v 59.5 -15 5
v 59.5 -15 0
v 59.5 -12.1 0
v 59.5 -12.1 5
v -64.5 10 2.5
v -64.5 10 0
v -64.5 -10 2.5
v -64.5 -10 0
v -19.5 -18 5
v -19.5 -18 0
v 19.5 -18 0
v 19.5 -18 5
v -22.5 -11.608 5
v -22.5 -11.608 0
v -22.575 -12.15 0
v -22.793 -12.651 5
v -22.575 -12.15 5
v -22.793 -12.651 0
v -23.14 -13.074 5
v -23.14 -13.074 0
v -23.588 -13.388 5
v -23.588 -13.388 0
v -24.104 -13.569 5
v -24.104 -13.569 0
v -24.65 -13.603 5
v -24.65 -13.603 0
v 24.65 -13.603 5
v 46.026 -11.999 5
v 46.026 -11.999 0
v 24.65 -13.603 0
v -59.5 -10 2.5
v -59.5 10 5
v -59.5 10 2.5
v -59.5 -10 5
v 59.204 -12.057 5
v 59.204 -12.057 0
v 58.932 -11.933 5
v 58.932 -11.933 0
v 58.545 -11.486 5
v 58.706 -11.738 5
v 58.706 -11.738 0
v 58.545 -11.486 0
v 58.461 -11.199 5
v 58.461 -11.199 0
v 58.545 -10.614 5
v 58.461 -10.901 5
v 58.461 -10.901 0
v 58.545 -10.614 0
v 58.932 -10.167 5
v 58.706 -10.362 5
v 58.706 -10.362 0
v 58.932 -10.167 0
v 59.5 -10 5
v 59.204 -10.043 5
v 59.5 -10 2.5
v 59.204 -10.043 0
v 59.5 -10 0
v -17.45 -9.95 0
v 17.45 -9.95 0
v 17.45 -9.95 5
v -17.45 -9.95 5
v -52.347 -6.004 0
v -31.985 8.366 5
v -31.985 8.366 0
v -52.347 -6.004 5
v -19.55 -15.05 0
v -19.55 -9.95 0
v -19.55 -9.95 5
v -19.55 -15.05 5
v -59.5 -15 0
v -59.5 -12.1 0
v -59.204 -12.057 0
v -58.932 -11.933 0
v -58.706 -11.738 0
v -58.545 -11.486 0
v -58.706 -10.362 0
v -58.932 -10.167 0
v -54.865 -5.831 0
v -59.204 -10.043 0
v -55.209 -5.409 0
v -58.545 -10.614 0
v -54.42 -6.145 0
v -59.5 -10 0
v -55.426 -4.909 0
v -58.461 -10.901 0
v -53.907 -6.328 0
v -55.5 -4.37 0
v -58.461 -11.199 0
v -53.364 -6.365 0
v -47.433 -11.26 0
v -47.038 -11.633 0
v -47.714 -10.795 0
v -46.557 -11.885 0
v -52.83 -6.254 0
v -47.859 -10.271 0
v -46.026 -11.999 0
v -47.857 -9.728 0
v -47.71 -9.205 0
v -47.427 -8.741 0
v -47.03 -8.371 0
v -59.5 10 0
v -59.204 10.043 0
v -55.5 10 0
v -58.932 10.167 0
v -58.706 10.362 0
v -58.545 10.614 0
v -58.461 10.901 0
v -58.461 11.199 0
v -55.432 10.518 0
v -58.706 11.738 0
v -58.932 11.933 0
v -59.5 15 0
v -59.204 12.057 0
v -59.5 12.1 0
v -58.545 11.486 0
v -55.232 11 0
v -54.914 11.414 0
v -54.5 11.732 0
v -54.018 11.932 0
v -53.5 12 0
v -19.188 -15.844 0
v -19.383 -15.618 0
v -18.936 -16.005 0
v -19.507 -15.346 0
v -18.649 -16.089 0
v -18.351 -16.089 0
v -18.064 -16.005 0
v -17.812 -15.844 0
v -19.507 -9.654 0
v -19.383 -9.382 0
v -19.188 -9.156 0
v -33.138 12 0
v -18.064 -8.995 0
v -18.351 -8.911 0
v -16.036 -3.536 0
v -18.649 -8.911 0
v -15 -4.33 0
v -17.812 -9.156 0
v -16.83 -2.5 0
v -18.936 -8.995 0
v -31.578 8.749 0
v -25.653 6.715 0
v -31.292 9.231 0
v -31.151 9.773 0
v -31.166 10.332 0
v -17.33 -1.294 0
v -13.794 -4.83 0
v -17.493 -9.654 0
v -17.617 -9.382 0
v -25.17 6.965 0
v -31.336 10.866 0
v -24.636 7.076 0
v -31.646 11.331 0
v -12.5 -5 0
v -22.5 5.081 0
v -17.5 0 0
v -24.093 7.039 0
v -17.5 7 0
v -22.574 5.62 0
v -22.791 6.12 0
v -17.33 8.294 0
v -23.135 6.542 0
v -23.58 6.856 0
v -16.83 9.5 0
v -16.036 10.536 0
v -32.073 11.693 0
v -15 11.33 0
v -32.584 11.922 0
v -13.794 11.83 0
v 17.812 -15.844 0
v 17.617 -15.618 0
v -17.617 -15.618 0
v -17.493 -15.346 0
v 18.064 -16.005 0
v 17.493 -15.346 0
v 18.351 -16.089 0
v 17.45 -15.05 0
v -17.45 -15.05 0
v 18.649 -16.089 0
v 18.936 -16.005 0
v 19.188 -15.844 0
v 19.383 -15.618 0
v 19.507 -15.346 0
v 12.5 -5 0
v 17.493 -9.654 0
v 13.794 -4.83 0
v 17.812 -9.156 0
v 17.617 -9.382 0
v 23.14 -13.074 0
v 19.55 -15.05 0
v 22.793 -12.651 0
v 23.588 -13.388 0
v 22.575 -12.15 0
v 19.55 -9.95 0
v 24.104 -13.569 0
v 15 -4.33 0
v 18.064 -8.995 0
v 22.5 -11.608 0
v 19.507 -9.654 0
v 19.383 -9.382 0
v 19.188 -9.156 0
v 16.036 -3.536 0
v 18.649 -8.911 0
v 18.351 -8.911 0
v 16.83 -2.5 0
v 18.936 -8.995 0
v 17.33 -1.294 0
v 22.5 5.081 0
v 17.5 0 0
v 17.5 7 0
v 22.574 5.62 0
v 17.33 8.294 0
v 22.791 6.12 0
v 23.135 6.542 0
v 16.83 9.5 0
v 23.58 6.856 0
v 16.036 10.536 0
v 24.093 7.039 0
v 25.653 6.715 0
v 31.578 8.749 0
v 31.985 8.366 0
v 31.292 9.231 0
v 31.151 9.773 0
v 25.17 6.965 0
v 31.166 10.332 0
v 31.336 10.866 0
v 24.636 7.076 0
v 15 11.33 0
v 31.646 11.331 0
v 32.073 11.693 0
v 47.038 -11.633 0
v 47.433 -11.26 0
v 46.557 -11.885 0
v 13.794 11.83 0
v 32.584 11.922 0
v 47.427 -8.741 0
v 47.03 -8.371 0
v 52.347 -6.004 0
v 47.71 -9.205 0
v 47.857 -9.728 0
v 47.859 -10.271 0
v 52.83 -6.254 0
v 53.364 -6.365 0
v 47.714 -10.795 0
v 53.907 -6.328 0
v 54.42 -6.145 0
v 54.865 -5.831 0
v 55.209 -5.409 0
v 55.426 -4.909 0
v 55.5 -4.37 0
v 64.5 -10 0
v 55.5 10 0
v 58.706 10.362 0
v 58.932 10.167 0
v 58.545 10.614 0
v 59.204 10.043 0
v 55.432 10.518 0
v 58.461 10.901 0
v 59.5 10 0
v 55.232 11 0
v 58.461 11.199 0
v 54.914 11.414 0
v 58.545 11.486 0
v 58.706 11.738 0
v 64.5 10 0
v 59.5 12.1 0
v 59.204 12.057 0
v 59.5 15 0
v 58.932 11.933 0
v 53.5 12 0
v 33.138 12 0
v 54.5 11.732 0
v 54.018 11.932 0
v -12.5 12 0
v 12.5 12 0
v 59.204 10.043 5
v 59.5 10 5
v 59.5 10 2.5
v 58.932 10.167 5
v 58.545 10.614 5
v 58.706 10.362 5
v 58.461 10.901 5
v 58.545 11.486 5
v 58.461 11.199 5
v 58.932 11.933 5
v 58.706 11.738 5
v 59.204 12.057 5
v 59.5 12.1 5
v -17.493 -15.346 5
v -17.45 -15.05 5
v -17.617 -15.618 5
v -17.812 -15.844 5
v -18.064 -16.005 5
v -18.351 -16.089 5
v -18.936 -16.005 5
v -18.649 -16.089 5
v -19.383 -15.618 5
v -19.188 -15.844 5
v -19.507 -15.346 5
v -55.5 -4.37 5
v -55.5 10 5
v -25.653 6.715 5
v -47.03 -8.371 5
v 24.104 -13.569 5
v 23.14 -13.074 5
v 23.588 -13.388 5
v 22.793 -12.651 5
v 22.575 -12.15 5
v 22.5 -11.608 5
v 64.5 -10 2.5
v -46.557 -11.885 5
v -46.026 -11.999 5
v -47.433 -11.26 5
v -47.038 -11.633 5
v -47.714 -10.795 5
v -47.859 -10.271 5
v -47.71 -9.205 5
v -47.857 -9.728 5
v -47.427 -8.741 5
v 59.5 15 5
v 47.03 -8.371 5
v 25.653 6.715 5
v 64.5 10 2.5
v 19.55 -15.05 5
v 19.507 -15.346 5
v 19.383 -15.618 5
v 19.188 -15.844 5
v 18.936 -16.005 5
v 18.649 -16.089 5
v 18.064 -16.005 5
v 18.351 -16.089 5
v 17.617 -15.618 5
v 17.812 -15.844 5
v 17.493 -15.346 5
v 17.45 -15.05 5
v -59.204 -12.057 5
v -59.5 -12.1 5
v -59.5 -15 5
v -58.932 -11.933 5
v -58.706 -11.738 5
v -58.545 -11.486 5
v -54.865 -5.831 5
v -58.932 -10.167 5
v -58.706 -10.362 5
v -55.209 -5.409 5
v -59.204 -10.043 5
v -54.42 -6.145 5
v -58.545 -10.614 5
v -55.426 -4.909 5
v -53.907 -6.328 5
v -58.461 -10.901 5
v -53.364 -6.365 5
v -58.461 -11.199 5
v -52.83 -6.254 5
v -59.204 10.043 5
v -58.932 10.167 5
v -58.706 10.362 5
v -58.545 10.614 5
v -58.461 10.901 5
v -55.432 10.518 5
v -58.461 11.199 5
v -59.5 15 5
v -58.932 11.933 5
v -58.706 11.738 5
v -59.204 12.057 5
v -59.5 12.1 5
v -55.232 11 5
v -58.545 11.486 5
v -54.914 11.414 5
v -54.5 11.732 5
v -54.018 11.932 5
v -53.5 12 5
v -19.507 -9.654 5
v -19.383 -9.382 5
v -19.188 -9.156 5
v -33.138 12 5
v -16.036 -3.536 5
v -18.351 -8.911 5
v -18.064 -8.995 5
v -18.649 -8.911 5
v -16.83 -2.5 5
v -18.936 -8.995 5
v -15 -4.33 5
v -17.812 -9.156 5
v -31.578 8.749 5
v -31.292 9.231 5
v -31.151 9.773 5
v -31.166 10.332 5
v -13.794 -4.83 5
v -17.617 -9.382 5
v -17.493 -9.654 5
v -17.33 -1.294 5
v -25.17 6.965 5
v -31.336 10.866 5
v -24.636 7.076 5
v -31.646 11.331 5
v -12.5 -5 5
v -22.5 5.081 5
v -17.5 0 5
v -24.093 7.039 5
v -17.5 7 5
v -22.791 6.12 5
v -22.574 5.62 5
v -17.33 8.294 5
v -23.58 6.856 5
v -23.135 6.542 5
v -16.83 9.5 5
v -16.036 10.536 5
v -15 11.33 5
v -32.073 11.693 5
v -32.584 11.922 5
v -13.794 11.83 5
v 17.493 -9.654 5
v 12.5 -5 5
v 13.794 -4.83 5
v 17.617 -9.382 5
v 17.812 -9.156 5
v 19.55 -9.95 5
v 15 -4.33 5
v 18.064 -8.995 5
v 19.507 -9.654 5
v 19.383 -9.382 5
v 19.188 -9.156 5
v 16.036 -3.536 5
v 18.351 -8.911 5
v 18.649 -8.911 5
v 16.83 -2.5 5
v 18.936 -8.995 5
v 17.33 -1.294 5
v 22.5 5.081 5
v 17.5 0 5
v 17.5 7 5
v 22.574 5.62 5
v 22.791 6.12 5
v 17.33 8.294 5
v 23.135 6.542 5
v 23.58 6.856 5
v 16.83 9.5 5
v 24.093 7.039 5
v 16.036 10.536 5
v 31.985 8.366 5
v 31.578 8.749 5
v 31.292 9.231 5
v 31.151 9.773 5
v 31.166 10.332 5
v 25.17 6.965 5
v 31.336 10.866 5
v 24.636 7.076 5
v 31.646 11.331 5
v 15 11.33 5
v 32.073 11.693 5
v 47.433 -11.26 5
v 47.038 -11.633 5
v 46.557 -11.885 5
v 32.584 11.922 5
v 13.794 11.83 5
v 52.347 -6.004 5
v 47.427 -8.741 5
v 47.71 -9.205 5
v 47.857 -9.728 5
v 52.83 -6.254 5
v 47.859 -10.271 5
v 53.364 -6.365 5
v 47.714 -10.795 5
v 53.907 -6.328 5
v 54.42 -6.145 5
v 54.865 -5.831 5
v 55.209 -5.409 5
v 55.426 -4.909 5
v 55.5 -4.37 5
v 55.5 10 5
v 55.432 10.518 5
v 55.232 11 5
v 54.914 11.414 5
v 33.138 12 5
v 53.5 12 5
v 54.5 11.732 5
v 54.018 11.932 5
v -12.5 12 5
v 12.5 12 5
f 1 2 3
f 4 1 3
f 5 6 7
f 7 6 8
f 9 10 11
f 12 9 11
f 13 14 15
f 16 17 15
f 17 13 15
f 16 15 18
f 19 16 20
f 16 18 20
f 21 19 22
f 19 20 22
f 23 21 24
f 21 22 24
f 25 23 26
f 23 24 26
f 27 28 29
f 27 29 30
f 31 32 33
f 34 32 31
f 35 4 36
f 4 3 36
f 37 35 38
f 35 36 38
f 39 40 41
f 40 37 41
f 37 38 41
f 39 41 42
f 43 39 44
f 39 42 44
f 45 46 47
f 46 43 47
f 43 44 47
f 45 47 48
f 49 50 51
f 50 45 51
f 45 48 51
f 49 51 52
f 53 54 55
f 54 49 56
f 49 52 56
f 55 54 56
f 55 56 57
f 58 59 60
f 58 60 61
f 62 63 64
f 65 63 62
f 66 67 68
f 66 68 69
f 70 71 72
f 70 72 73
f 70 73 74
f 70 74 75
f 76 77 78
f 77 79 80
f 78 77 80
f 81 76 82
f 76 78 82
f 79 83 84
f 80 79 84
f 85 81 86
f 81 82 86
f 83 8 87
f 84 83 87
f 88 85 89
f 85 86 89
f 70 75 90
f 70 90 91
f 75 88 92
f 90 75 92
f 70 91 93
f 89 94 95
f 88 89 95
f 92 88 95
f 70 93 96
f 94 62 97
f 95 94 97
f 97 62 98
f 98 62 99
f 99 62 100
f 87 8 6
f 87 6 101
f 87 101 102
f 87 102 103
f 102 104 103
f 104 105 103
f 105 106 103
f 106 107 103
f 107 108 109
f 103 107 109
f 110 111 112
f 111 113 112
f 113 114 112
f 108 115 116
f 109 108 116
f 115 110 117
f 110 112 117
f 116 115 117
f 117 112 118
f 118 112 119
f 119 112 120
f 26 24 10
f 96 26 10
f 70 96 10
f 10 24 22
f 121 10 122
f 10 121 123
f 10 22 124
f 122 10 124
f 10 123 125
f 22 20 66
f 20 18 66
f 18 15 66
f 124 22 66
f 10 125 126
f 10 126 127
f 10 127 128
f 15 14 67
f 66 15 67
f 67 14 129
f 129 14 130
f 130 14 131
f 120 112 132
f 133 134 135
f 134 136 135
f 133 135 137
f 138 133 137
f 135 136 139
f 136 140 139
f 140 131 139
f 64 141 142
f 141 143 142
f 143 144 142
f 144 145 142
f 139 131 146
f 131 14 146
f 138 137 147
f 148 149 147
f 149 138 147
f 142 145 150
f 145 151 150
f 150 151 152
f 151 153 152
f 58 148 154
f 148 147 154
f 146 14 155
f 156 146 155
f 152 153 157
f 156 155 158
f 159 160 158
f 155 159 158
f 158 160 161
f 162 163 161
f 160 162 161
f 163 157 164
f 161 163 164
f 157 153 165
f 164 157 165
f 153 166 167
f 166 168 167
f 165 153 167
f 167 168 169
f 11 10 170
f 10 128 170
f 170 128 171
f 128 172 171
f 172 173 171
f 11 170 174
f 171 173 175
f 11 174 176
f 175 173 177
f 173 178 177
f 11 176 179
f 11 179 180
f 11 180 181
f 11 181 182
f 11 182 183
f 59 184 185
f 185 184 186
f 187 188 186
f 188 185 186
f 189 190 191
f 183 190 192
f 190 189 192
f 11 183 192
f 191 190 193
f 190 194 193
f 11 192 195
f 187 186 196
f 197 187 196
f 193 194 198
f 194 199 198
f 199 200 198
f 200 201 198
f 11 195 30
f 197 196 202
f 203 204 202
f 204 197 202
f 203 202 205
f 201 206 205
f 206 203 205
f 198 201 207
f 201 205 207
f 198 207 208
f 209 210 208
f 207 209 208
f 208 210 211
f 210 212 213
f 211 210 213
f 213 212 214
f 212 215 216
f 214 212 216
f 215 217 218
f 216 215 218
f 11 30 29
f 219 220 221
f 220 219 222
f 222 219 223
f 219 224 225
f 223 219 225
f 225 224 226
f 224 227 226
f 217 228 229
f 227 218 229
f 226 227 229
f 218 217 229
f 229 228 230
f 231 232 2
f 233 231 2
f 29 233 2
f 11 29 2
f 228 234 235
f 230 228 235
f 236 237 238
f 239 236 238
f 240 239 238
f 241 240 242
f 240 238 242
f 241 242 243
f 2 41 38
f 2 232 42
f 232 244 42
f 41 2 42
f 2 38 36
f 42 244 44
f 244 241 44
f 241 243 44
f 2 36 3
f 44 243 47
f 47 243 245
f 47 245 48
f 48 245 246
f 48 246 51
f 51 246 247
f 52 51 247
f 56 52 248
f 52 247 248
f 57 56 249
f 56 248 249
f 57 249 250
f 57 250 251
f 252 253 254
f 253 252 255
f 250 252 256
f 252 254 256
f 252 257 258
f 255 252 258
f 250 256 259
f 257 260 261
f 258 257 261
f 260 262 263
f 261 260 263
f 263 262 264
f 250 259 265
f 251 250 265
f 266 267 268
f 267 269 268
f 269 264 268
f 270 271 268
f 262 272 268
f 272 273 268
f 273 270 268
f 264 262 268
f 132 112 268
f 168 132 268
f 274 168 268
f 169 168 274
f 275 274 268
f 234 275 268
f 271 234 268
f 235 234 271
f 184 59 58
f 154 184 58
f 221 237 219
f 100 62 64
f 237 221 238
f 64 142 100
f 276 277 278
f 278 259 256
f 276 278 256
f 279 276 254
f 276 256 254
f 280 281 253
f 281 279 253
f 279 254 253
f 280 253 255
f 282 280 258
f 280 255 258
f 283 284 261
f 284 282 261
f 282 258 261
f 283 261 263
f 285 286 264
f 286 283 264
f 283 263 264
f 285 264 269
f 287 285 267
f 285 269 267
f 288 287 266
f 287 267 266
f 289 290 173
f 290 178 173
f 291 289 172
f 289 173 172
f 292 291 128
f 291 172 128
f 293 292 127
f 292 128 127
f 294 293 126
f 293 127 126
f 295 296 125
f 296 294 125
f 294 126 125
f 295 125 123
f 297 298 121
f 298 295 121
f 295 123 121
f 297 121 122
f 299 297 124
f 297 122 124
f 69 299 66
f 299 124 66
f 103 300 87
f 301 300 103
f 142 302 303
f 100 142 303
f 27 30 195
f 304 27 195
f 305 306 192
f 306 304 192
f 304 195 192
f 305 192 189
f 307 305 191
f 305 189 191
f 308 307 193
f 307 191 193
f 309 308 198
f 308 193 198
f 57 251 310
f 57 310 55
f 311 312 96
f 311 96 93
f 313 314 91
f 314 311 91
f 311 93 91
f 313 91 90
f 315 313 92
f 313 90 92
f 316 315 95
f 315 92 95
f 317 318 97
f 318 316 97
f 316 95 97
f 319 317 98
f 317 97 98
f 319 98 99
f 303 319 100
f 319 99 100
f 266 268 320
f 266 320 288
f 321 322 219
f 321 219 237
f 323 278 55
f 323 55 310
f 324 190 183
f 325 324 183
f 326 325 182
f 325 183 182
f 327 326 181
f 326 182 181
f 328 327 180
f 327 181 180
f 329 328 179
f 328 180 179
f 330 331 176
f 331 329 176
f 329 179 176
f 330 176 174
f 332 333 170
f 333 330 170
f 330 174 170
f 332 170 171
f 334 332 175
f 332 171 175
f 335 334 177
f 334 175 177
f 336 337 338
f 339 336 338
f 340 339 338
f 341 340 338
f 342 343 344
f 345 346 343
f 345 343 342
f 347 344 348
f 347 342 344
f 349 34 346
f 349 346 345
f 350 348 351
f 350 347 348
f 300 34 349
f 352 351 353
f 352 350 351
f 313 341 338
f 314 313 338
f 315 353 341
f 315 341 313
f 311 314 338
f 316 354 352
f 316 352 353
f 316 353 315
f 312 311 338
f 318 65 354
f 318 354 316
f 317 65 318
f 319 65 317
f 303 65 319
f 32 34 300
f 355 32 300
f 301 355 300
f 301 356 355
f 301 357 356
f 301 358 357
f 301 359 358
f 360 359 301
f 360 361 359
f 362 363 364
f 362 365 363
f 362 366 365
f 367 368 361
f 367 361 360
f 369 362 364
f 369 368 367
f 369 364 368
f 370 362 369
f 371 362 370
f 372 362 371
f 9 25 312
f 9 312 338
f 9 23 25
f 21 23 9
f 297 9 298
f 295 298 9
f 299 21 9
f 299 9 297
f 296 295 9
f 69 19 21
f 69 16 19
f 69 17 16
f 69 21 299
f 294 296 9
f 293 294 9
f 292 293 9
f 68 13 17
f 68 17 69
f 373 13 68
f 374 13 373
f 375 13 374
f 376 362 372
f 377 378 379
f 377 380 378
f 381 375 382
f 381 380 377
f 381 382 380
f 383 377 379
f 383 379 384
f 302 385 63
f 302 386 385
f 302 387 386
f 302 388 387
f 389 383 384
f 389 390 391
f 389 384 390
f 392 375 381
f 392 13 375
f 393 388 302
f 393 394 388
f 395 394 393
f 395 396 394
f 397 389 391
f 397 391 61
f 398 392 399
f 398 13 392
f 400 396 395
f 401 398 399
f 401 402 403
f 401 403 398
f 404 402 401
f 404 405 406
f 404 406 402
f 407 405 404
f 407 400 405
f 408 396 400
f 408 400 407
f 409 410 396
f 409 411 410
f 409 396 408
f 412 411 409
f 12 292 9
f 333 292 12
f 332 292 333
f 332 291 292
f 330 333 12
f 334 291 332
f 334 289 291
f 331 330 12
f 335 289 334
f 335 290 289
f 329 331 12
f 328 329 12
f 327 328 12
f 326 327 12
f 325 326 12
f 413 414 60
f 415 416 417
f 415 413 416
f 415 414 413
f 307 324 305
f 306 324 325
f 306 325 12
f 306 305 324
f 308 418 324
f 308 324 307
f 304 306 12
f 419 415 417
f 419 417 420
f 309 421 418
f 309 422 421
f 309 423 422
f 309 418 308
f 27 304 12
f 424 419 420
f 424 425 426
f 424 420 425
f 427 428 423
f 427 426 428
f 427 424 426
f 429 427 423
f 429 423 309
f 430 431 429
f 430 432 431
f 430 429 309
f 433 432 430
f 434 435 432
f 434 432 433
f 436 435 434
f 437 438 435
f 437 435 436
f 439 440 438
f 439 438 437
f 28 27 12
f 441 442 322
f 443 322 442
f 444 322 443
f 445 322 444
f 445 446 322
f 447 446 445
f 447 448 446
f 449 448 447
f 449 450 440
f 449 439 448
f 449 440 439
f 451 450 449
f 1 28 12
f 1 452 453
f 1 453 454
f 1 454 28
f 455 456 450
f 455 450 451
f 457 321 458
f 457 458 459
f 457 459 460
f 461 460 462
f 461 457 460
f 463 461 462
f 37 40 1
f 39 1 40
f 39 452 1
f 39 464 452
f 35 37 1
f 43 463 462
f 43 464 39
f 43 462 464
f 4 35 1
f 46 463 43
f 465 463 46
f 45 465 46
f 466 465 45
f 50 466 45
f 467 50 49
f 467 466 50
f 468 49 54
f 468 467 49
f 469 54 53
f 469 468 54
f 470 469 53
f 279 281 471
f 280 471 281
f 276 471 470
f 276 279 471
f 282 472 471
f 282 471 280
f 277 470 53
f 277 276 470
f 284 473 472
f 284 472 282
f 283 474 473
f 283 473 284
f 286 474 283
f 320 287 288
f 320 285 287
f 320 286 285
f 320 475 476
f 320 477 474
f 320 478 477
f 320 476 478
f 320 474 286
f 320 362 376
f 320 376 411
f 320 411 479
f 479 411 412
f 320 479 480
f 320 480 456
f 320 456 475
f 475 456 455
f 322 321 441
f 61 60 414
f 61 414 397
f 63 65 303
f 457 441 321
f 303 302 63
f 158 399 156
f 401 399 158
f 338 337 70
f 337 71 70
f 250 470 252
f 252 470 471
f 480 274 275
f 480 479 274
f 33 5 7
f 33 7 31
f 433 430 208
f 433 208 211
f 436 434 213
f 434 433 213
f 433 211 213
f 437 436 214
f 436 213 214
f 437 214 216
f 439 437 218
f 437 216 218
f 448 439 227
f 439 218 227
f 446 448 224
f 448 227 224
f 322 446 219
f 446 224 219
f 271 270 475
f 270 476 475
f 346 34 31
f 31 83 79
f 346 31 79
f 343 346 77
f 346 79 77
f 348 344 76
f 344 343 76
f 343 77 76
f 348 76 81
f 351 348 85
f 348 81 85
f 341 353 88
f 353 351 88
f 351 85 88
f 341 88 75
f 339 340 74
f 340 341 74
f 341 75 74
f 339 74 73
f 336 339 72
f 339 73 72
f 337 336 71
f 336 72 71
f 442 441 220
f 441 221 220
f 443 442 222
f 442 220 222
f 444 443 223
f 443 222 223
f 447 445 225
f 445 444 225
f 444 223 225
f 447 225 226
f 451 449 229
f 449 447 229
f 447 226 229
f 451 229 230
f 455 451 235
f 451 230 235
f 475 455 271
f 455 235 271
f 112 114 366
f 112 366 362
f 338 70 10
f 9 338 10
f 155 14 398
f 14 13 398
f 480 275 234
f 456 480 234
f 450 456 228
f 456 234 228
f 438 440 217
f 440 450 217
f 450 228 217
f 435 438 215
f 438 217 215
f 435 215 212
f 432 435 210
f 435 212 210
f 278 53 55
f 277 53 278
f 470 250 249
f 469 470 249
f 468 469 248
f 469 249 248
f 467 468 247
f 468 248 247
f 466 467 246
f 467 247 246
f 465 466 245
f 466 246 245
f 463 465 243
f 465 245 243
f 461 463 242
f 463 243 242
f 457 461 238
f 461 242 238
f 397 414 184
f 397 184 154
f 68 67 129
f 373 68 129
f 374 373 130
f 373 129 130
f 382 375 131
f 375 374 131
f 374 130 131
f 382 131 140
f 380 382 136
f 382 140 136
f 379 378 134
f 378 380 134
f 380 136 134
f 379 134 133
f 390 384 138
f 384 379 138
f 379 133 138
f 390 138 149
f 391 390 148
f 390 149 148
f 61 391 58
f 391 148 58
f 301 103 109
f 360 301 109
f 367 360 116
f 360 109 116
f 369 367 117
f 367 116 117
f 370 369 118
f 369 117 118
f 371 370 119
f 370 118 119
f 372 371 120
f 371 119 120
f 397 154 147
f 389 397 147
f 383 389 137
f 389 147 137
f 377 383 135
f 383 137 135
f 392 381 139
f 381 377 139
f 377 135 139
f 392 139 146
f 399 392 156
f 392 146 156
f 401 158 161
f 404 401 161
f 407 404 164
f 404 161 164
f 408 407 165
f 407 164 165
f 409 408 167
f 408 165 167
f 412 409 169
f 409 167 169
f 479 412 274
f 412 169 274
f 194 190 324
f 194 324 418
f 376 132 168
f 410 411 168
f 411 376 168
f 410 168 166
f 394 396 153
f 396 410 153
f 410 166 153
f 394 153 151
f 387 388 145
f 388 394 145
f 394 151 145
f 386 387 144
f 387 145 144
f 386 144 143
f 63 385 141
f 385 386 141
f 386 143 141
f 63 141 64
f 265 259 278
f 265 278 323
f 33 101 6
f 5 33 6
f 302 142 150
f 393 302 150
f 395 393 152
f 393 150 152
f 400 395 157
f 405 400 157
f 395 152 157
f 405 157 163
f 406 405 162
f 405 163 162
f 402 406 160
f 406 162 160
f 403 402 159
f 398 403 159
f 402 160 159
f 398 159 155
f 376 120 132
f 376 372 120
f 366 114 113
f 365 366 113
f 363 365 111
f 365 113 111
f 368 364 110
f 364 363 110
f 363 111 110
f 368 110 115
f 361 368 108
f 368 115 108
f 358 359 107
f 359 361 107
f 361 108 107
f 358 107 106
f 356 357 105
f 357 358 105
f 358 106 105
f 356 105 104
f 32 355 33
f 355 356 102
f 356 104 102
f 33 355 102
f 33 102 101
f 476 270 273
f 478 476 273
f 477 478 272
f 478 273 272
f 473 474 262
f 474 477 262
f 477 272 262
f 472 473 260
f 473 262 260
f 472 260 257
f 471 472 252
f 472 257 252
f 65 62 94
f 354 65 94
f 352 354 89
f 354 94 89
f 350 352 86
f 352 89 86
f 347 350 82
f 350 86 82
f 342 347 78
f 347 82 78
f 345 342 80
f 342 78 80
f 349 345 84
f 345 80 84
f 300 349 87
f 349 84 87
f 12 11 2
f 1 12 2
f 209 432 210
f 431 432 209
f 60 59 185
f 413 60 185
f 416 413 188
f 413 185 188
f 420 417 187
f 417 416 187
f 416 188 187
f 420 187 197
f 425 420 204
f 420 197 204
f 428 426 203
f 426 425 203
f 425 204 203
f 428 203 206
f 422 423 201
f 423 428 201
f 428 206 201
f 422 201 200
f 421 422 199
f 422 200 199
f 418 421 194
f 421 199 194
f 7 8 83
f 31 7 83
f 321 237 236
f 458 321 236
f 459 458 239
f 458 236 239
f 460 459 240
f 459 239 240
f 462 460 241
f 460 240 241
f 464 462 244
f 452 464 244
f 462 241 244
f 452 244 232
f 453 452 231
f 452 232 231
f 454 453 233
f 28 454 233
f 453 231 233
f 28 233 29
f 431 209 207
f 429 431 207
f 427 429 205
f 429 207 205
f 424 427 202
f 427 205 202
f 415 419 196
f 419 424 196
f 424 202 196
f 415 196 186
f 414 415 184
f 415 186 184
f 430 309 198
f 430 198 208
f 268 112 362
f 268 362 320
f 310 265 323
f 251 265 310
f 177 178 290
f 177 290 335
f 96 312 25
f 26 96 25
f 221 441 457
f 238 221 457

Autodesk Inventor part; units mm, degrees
ref_plane "YZ Plane" through (0, 0, 0) normal (1, 0, 0) x (0, 1, 0)
ref_plane "XZ Plane" through (0, 0, 0) normal (0, 1, 0) x (-1, 0, 0)
ref_plane "XY Plane" through (0, 0, 0) normal (0, 0, 1) x (1, 0, 0)
sketch "スケッチ1" plane through (0, 0, 0) normal (0, 0, 1) x (1, 0, 0)
  line L0 (-59.5, -15) -> (59.5, -15) construction
  line L1 (59.5, -15) -> (59.5, 15) construction
  line L2 (59.5, 15) -> (-59.5, 15) construction
  line L3 (-59.5, 15) -> (-59.5, -15) construction
  line L4 (-59.5, -15) -> (59.5, 15) construction
  line L5 (59.5, -15) -> (-59.5, 15) construction
  line L6 (-59.5, 12.1) -> (-59.5, 15)
  line L7 (-59.5, 15) -> (59.5, 15)
  line L8 (59.5, 15) -> (59.5, 12.1)
  line L9 (-59.5, -12.1) -> (-59.5, -15)
  line L10 (59.5, -15) -> (59.5, -12.1)
  line L11 (-59.5, 10) -> (-64.5, 10)
  line L12 (-64.5, 10) -> (-64.5, -10)
  line L13 (-64.5, -10) -> (-59.5, -10)
  arc A0 (-59.5, 10) -> (-59.5, 12.1) centre (-59.5, 11.05) ccw
  line L14 (0, 0) -> (0, 15) construction
  line L15 (0, 0) -> (-59.5, 0) construction
  arc A1 (-59.5, -12.1) -> (-59.5, -10) centre (-59.5, -11.05) ccw
  line L16 (59.5, 10) -> (64.5, 10)
  line L17 (64.5, 10) -> (64.5, -10)
  line L18 (64.5, -10) -> (59.5, -10)
  arc A2 (59.5, 12.1) -> (59.5, 10) centre (59.5, 11.05) ccw
  arc A3 (59.5, -10) -> (59.5, -12.1) centre (59.5, -11.05) ccw
  line L19 (-59.5, -15) -> (-19.5, -18)
  line L20 (-19.5, -18) -> (19.5, -18)
  line L21 (19.5, -18) -> (59.5, -15)
  line L22 (-19.5, -10) -> (19.5, -10) construction
  line L23 (19.5, -10) -> (19.5, -15) construction
  line L24 (19.5, -15) -> (-19.5, -15) construction
  line L25 (-19.5, -15) -> (-19.5, -10) construction
  line L26 (19.55, -9.95) -> (-19.55, -9.95)
  line L27 (-19.55, -9.95) -> (-19.55, -15.05)
  line L28 (-19.55, -15.05) -> (19.55, -15.05)
  line L29 (19.55, -15.05) -> (19.55, -9.95)
  circle A4 centre (-18.5, -9.95) radius 1.05
  circle A5 centre (-18.5, -15.05) radius 1.05
  circle A6 centre (18.5, -9.95) radius 1.05
  circle A7 centre (18.5, -15.05) radius 1.05
  dimension "d9" = 2.1
  dimension "d0" = 119
  dimension "d1" = 30
  dimension "d2" = 1.05
  dimension "d3" = 20
  dimension "d4" = 5
  dimension "d5" = 5
  dimension "d6" = 0.05
  dimension "d7" = 39
  dimension "d8" = 3
extrude "押し出し1" add sketch "スケッチ1" along normal blind 5
sketch "スケッチ2" plane through (0, 0, 5) normal (0, 0, 1) x (1, 0, 0)
  line L0 (59.5, 12.1) -> (59.5, 15) projected
  line L1 (-59.5, 15) -> (-59.5, 12.1) projected
  line L2 (65.6261, 13.972) -> (59.5, 13.972)
  line L3 (59.5, 13.972) -> (59.5, -16.1)
  line L4 (59.5, -16.1) -> (65.6261, -16.1)
  line L5 (65.6261, -16.1) -> (65.6261, 13.972)
  line L6 (-65.8886, -16.1) -> (-59.5, -16.1)
  line L7 (-59.5, -16.1) -> (-59.5, 18.3327)
  line L8 (-59.5, 18.3327) -> (-65.8886, 18.3327)
  line L9 (-65.8886, 18.3327) -> (-65.8886, -16.1)
  point P0 (0, 0)
extrude "押し出し2" cut sketch "スケッチ2" against normal blind 2.5
sketch "スケッチ8" plane through (0, 0, 5) normal (0, 0, 1) x (1, 0, 0)
  line L0 (59.5, 15) -> (-59.5, 15) projected
  line L1 (-59.5, 10) -> (-59.5, -10) projected
  line L2 (-59.5, -15) -> (-19.5, -18) projected
  line L3 (17.45, -15.05) -> (-17.45, -15.05) projected
  arc A0 (-19.55, -15.05) -> (-17.45, -15.05) centre (-18.5, -15.05) ccw projected
  line L4 (-19.55, -15.05) -> (-19.55, -9.95) projected
  arc A1 (-17.45, -9.95) -> (-19.55, -9.95) centre (-18.5, -9.95) ccw projected
  line L5 (-17.45, -9.95) -> (17.45, -9.95) projected
  arc A2 (19.55, -9.95) -> (17.45, -9.95) centre (18.5, -9.95) ccw projected
  line L6 (19.55, -9.95) -> (19.55, -15.05) projected
  arc A3 (17.45, -15.05) -> (19.55, -15.05) centre (18.5, -15.05) ccw projected
  line L7 (-55.5, 12) -> (-22.5, 12) construction
  line L8 (-22.5, 12) -> (-22.5, -13.7638) construction
  line L9 (-22.5, -13.7638) -> (-55.5, -11.2888) construction
  line L10 (-55.5, -11.2888) -> (-55.5, 12) construction
  line L11 (17.5013, -10) -> (-17.5013, -10) construction
  arc A4 (-17.5013, -10) -> (-19.5, -9.95) centre (-18.5, -9.95) ccw construction
  line L12 (-19.5, -9.95) -> (-19.5, -15.05) construction
  arc A5 (-19.5, -15.05) -> (-17.5013, -15) centre (-18.5, -15.05) ccw construction
  line L13 (-17.5013, -15) -> (17.5013, -15) construction
  arc A6 (17.5013, -15) -> (19.5, -15.05) centre (18.5, -15.05) ccw construction
  line L14 (19.5, -15.05) -> (19.5, -9.95) construction
  arc A7 (19.5, -9.95) -> (17.5013, -10) centre (18.5, -9.95) ccw construction
  line L15 (-17.5, 12) -> (17.5, 12)
  line L16 (17.5, 12) -> (17.5, -5)
  line L17 (17.5, -5) -> (-17.5, -5)
  line L18 (-17.5, -5) -> (-17.5, 12)
  line L19 (0, 0) -> (0, 15) construction
  line L20 (-22.5, 12) -> (-55.5, -11.2888) construction
  line L21 (-55.5, 12) -> (-26.8358, 12)
  line L22 (-26.8358, 12) -> (-55.5, -8.2289)
  line L23 (-55.5, -8.2289) -> (-55.5, 12)
  line L24 (-51.5807, -11.5827) -> (-22.5, -13.7638)
  line L25 (-22.5, -13.7638) -> (-22.5, 8.9401)
  line L26 (-22.5, 8.9401) -> (-51.5807, -11.5827)
  line L27 (55.5, 12) -> (22.5, 12) construction
  line L28 (22.5, 12) -> (22.5, -13.7638) construction
  line L29 (22.5, -13.7638) -> (55.5, -11.2888) construction
  line L30 (55.5, -11.2888) -> (55.5, 12) construction
  line L31 (22.5, 12) -> (55.5, -11.2888) construction
  line L32 (55.5, 12) -> (26.8358, 12)
  line L33 (26.8358, 12) -> (55.5, -8.2289)
  line L34 (55.5, -8.2289) -> (55.5, 12)
  line L35 (51.5807, -11.5827) -> (22.5, -13.7638)
  line L36 (22.5, -13.7638) -> (22.5, 8.9401)
  line L37 (22.5, 8.9401) -> (51.5807, -11.5827)
  dimension "d51" = 4
  dimension "d52" = 3
  dimension "d53" = 0.05
  dimension "d54" = 3
  dimension "d55" = 4
  dimension "d56" = 5
  dimension "d57" = 5
  dimension "d58" = 5
extrude "押し出し6" cut sketch "スケッチ8" against normal blind 10 contours L15 L16 L17 L18 | L21 L22 L23 | L26 L25 L24 | L34 L33 L32 | L35 L36 L37
fillet "フィレット4" radius 2 12 edges at (-55.5, 12, 2.5) (-55.5, -8.2289, 2.5) (-26.8358, 12, 2.5) (-22.5, 8.9401, 2.5) (-51.5807, -11.5827, 2.5) (-22.5, -13.7638, 2.5) (22.5, 8.9401, 2.5) (26.8358, 12, 2.5) (55.5, -8.2289, 2.5) (55.5, 12, 2.5) (22.5, -13.7638, 2.5) (51.5807, -11.5827, 2.5)
fillet "フィレット4" radius 5 4 edges at (-17.5, -5, 2.5) (-17.5, 12, 2.5) (17.5, 12, 2.5) (17.5, -5, 2.5)
properties part number "コックピット_サブフレーム_1_6" material "アセタール樹脂、黒"
